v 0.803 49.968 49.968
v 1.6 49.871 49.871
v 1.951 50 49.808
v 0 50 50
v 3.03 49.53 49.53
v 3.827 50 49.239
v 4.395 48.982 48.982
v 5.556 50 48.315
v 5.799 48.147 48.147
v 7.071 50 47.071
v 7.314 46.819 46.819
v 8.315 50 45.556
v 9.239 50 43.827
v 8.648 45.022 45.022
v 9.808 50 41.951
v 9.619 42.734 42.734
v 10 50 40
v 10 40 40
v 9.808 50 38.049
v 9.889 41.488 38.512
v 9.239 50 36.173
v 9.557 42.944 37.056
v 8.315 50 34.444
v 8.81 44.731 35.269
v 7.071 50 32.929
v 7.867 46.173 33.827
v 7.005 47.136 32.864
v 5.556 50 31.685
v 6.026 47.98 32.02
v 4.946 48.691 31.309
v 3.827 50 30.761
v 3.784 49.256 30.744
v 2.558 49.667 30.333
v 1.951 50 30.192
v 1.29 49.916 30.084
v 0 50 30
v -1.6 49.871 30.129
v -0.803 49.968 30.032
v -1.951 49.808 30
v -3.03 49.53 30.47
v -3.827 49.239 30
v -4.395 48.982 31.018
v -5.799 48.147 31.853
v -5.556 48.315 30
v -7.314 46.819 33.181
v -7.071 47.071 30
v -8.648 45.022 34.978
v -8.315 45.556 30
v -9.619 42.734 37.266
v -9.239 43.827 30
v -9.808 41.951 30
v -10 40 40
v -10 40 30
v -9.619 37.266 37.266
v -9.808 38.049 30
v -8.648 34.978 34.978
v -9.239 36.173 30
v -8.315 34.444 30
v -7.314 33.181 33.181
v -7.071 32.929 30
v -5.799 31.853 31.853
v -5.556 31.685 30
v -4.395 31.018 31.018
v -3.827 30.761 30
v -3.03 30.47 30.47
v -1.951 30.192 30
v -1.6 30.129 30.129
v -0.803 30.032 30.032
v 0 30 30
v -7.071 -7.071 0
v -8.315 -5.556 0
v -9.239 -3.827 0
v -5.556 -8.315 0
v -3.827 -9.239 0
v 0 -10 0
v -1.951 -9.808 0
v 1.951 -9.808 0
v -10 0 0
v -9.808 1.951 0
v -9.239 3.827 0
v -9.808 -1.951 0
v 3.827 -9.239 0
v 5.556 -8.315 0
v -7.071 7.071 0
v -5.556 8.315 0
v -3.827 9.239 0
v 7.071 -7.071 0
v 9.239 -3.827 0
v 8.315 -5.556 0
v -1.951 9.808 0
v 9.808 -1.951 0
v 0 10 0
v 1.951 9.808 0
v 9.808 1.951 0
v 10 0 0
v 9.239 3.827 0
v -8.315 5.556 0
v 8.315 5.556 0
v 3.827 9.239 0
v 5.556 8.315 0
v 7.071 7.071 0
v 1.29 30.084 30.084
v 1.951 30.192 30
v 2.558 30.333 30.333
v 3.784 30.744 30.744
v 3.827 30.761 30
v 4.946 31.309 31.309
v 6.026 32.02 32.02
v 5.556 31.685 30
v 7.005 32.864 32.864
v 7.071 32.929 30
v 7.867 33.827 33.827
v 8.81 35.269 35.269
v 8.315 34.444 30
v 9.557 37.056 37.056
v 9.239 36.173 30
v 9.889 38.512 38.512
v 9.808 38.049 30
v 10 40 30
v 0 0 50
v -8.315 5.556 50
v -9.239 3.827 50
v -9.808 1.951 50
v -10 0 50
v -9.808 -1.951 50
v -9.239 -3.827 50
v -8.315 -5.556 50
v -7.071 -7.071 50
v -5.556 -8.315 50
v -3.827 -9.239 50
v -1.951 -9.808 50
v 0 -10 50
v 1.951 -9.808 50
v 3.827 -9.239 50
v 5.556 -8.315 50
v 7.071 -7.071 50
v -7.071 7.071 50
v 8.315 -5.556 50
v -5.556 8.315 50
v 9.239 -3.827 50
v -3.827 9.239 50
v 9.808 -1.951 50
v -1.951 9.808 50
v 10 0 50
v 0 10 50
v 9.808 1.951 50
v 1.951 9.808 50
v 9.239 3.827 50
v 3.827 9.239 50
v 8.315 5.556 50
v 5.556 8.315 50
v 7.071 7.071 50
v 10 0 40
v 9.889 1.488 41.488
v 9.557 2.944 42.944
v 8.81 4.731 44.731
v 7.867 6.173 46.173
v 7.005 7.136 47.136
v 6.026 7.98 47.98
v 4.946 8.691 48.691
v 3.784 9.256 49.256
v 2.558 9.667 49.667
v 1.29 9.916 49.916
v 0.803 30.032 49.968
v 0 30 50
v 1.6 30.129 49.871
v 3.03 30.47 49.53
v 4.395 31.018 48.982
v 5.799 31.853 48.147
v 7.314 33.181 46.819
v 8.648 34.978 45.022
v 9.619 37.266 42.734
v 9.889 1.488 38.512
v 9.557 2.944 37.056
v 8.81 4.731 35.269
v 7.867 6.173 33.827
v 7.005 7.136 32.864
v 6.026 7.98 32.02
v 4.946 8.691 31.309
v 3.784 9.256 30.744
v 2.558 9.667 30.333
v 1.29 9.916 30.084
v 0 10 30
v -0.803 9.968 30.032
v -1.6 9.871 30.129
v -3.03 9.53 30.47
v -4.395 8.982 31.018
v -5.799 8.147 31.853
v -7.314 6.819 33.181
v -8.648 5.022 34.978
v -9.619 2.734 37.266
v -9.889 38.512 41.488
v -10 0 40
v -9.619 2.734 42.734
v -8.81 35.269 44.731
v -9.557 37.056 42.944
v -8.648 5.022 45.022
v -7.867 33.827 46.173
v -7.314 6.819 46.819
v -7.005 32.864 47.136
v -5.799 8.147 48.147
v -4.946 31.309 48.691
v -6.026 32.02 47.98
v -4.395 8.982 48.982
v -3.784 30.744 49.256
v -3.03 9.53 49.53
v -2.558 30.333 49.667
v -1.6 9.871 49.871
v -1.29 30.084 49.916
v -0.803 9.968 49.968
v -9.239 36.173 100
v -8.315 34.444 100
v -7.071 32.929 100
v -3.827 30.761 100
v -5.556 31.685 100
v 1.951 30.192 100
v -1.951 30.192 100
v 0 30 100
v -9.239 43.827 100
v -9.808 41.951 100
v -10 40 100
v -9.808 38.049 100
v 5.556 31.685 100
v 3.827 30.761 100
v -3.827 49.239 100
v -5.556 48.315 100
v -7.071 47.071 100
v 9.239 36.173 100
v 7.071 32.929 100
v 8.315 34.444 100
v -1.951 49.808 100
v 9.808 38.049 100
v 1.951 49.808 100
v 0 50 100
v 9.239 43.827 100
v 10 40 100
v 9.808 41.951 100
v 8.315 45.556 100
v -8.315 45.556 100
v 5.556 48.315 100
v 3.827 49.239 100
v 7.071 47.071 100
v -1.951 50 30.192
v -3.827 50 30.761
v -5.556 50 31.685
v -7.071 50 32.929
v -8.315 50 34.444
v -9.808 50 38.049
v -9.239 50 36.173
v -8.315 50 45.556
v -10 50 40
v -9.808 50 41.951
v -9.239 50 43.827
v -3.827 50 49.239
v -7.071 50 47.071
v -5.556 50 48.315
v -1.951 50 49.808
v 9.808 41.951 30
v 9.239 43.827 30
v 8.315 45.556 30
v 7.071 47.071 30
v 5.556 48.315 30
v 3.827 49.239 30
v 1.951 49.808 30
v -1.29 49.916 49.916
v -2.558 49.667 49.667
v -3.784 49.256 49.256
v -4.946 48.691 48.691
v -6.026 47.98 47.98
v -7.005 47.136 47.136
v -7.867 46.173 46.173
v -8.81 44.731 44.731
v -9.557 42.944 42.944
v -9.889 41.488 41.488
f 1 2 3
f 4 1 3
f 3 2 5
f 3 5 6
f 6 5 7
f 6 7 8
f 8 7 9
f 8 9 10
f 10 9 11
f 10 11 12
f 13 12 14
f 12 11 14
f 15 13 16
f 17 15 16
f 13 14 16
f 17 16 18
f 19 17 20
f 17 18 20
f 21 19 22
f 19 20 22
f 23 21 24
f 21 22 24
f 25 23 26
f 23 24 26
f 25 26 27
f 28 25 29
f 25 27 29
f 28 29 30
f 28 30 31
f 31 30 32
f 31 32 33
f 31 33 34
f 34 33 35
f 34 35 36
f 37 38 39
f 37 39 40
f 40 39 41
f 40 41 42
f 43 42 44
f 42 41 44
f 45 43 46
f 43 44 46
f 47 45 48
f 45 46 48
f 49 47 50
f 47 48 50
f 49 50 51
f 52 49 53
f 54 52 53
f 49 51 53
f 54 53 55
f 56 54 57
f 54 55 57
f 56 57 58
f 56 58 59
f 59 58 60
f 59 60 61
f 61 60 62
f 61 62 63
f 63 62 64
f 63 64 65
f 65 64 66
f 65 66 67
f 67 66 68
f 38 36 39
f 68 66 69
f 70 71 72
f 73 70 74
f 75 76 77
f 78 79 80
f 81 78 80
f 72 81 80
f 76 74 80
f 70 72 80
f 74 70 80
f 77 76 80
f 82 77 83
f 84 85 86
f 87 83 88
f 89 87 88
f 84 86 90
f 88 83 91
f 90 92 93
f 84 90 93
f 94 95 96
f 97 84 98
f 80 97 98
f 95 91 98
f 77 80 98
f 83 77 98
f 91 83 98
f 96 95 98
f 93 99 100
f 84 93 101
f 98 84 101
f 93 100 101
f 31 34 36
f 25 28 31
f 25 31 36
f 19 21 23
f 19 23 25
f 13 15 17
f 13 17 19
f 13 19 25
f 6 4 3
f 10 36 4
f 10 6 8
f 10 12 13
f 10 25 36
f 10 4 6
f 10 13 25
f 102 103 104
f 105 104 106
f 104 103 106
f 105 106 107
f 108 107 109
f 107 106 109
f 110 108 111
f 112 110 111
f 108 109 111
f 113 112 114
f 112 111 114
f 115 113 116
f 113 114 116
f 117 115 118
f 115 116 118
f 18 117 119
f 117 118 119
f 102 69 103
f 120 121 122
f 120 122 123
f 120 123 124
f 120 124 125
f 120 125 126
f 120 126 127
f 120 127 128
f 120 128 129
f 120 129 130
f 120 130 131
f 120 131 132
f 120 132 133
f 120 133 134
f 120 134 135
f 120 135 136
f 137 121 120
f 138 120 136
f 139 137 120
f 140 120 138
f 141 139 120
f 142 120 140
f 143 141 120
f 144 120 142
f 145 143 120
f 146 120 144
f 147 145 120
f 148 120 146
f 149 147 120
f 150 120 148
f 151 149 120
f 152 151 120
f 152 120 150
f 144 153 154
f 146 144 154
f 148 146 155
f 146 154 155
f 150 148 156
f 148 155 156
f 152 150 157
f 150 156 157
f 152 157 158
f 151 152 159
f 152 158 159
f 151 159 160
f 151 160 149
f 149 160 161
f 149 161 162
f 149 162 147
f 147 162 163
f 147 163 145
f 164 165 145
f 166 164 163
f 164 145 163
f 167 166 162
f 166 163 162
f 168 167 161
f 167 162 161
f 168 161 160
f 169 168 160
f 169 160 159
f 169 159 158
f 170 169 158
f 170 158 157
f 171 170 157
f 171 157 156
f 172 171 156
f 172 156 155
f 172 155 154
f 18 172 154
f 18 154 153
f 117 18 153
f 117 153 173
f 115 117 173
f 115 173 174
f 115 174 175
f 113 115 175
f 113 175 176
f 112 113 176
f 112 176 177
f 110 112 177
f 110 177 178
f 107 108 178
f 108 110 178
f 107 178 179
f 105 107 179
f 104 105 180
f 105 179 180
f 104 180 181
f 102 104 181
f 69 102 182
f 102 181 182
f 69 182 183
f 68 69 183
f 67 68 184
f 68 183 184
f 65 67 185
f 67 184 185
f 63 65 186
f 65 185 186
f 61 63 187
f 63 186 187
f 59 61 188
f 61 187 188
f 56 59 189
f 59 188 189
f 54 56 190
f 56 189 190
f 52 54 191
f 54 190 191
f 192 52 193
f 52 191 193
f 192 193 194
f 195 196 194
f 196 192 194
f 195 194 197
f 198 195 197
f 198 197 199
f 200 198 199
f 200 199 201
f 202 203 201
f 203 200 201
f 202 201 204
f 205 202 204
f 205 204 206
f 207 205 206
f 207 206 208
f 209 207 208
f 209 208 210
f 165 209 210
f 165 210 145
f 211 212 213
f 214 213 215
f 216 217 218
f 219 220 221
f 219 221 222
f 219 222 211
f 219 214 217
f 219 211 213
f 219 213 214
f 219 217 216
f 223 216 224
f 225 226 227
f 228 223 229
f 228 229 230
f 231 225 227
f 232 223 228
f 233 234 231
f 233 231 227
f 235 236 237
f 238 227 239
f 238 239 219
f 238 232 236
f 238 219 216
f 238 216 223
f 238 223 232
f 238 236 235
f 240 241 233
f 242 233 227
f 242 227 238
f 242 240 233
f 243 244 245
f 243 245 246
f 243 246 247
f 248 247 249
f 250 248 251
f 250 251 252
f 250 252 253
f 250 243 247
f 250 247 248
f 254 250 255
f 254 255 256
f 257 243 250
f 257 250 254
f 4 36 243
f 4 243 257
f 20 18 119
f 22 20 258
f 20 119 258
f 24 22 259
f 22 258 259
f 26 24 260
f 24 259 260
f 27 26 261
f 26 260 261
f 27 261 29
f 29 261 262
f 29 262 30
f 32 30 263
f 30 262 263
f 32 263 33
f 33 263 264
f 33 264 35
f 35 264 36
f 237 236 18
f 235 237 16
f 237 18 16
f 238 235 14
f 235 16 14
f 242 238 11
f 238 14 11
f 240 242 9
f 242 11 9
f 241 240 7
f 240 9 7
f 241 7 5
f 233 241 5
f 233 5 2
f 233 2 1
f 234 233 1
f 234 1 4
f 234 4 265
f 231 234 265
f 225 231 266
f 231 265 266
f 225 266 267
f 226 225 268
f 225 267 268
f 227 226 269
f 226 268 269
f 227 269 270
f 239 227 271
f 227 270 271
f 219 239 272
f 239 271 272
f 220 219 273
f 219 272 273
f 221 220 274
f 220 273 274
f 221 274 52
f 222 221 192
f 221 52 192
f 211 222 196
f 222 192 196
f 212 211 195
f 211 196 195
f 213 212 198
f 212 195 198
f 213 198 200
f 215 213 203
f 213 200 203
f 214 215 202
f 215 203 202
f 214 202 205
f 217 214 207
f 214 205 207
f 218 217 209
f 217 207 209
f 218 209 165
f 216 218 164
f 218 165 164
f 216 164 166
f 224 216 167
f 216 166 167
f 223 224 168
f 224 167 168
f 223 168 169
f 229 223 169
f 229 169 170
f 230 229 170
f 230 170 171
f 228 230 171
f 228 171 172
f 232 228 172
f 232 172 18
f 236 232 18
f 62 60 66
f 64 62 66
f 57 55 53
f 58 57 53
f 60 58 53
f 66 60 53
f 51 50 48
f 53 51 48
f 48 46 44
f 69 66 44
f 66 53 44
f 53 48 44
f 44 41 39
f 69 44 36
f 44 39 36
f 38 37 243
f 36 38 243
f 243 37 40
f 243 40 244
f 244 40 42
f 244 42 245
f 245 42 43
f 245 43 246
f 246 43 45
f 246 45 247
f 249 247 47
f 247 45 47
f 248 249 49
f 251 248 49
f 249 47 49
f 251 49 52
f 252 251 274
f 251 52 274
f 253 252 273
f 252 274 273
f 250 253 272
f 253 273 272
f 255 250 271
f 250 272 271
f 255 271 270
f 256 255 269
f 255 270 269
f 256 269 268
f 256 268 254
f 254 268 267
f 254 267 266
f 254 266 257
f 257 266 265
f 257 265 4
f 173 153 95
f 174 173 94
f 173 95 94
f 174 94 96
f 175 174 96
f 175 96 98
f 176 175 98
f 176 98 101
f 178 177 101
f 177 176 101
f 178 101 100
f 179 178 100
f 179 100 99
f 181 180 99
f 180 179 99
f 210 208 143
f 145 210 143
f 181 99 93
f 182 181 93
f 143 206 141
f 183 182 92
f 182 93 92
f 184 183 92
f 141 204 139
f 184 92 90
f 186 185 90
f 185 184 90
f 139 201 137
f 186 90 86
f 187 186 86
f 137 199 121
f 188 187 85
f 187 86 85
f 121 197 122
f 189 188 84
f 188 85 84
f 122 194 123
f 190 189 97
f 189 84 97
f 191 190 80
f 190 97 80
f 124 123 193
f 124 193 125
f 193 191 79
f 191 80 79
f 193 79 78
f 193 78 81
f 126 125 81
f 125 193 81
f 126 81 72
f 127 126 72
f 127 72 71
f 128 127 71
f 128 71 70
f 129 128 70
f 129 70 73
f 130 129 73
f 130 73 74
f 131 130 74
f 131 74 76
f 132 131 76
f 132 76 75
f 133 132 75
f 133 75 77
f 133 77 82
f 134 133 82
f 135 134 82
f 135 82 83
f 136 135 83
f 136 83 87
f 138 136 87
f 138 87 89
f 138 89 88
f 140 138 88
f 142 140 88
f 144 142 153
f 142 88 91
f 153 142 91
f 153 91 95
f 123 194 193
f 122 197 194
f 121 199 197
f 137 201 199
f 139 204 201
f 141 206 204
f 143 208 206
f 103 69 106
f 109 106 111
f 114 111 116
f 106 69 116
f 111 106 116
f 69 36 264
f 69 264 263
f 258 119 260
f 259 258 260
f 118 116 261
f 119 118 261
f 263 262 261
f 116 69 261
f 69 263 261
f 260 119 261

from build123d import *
from build123d.topology import SkipClean

# Parameters (mm, degrees)
SKETCH1_R           = 10
BOSS_EXTRUDE1_DEPTH = 50
SKETCH2_R           = 10
BOSS_EXTRUDE2_DEPTH = 50
BOSS_EXTRUDE3_START = 30
SKETCH4_R           = 10
BOSS_EXTRUDE3_DEPTH = 70


with BuildPart() as part:
    # Sketch1 → Boss-Extrude1 (new body)
    with BuildSketch(Plane.XY):
        Circle(SKETCH1_R)
    extrude(amount=BOSS_EXTRUDE1_DEPTH)

    # Sketch2 → Boss-Extrude2 (add)
    with SkipClean():  # the faces are left unmerged after this step: merging them gives an invalid solid
        with BuildSketch(Plane(origin=(0, 0, 0), x_dir=(1, 0, 0), z_dir=(0, 1, 0))):
            with Locations((0, -40)):
                Circle(SKETCH2_R)
        extrude(amount=BOSS_EXTRUDE2_DEPTH)

    # Sketch4 → Boss-Extrude3 (add)
    with SkipClean():  # the faces are left unmerged after this step: merging them gives an invalid solid
        with BuildSketch(Plane.XY.offset(BOSS_EXTRUDE3_START)):
            with Locations((0, 40)):
                Circle(SKETCH4_R)
        extrude(amount=BOSS_EXTRUDE3_DEPTH)


solid = part.part
